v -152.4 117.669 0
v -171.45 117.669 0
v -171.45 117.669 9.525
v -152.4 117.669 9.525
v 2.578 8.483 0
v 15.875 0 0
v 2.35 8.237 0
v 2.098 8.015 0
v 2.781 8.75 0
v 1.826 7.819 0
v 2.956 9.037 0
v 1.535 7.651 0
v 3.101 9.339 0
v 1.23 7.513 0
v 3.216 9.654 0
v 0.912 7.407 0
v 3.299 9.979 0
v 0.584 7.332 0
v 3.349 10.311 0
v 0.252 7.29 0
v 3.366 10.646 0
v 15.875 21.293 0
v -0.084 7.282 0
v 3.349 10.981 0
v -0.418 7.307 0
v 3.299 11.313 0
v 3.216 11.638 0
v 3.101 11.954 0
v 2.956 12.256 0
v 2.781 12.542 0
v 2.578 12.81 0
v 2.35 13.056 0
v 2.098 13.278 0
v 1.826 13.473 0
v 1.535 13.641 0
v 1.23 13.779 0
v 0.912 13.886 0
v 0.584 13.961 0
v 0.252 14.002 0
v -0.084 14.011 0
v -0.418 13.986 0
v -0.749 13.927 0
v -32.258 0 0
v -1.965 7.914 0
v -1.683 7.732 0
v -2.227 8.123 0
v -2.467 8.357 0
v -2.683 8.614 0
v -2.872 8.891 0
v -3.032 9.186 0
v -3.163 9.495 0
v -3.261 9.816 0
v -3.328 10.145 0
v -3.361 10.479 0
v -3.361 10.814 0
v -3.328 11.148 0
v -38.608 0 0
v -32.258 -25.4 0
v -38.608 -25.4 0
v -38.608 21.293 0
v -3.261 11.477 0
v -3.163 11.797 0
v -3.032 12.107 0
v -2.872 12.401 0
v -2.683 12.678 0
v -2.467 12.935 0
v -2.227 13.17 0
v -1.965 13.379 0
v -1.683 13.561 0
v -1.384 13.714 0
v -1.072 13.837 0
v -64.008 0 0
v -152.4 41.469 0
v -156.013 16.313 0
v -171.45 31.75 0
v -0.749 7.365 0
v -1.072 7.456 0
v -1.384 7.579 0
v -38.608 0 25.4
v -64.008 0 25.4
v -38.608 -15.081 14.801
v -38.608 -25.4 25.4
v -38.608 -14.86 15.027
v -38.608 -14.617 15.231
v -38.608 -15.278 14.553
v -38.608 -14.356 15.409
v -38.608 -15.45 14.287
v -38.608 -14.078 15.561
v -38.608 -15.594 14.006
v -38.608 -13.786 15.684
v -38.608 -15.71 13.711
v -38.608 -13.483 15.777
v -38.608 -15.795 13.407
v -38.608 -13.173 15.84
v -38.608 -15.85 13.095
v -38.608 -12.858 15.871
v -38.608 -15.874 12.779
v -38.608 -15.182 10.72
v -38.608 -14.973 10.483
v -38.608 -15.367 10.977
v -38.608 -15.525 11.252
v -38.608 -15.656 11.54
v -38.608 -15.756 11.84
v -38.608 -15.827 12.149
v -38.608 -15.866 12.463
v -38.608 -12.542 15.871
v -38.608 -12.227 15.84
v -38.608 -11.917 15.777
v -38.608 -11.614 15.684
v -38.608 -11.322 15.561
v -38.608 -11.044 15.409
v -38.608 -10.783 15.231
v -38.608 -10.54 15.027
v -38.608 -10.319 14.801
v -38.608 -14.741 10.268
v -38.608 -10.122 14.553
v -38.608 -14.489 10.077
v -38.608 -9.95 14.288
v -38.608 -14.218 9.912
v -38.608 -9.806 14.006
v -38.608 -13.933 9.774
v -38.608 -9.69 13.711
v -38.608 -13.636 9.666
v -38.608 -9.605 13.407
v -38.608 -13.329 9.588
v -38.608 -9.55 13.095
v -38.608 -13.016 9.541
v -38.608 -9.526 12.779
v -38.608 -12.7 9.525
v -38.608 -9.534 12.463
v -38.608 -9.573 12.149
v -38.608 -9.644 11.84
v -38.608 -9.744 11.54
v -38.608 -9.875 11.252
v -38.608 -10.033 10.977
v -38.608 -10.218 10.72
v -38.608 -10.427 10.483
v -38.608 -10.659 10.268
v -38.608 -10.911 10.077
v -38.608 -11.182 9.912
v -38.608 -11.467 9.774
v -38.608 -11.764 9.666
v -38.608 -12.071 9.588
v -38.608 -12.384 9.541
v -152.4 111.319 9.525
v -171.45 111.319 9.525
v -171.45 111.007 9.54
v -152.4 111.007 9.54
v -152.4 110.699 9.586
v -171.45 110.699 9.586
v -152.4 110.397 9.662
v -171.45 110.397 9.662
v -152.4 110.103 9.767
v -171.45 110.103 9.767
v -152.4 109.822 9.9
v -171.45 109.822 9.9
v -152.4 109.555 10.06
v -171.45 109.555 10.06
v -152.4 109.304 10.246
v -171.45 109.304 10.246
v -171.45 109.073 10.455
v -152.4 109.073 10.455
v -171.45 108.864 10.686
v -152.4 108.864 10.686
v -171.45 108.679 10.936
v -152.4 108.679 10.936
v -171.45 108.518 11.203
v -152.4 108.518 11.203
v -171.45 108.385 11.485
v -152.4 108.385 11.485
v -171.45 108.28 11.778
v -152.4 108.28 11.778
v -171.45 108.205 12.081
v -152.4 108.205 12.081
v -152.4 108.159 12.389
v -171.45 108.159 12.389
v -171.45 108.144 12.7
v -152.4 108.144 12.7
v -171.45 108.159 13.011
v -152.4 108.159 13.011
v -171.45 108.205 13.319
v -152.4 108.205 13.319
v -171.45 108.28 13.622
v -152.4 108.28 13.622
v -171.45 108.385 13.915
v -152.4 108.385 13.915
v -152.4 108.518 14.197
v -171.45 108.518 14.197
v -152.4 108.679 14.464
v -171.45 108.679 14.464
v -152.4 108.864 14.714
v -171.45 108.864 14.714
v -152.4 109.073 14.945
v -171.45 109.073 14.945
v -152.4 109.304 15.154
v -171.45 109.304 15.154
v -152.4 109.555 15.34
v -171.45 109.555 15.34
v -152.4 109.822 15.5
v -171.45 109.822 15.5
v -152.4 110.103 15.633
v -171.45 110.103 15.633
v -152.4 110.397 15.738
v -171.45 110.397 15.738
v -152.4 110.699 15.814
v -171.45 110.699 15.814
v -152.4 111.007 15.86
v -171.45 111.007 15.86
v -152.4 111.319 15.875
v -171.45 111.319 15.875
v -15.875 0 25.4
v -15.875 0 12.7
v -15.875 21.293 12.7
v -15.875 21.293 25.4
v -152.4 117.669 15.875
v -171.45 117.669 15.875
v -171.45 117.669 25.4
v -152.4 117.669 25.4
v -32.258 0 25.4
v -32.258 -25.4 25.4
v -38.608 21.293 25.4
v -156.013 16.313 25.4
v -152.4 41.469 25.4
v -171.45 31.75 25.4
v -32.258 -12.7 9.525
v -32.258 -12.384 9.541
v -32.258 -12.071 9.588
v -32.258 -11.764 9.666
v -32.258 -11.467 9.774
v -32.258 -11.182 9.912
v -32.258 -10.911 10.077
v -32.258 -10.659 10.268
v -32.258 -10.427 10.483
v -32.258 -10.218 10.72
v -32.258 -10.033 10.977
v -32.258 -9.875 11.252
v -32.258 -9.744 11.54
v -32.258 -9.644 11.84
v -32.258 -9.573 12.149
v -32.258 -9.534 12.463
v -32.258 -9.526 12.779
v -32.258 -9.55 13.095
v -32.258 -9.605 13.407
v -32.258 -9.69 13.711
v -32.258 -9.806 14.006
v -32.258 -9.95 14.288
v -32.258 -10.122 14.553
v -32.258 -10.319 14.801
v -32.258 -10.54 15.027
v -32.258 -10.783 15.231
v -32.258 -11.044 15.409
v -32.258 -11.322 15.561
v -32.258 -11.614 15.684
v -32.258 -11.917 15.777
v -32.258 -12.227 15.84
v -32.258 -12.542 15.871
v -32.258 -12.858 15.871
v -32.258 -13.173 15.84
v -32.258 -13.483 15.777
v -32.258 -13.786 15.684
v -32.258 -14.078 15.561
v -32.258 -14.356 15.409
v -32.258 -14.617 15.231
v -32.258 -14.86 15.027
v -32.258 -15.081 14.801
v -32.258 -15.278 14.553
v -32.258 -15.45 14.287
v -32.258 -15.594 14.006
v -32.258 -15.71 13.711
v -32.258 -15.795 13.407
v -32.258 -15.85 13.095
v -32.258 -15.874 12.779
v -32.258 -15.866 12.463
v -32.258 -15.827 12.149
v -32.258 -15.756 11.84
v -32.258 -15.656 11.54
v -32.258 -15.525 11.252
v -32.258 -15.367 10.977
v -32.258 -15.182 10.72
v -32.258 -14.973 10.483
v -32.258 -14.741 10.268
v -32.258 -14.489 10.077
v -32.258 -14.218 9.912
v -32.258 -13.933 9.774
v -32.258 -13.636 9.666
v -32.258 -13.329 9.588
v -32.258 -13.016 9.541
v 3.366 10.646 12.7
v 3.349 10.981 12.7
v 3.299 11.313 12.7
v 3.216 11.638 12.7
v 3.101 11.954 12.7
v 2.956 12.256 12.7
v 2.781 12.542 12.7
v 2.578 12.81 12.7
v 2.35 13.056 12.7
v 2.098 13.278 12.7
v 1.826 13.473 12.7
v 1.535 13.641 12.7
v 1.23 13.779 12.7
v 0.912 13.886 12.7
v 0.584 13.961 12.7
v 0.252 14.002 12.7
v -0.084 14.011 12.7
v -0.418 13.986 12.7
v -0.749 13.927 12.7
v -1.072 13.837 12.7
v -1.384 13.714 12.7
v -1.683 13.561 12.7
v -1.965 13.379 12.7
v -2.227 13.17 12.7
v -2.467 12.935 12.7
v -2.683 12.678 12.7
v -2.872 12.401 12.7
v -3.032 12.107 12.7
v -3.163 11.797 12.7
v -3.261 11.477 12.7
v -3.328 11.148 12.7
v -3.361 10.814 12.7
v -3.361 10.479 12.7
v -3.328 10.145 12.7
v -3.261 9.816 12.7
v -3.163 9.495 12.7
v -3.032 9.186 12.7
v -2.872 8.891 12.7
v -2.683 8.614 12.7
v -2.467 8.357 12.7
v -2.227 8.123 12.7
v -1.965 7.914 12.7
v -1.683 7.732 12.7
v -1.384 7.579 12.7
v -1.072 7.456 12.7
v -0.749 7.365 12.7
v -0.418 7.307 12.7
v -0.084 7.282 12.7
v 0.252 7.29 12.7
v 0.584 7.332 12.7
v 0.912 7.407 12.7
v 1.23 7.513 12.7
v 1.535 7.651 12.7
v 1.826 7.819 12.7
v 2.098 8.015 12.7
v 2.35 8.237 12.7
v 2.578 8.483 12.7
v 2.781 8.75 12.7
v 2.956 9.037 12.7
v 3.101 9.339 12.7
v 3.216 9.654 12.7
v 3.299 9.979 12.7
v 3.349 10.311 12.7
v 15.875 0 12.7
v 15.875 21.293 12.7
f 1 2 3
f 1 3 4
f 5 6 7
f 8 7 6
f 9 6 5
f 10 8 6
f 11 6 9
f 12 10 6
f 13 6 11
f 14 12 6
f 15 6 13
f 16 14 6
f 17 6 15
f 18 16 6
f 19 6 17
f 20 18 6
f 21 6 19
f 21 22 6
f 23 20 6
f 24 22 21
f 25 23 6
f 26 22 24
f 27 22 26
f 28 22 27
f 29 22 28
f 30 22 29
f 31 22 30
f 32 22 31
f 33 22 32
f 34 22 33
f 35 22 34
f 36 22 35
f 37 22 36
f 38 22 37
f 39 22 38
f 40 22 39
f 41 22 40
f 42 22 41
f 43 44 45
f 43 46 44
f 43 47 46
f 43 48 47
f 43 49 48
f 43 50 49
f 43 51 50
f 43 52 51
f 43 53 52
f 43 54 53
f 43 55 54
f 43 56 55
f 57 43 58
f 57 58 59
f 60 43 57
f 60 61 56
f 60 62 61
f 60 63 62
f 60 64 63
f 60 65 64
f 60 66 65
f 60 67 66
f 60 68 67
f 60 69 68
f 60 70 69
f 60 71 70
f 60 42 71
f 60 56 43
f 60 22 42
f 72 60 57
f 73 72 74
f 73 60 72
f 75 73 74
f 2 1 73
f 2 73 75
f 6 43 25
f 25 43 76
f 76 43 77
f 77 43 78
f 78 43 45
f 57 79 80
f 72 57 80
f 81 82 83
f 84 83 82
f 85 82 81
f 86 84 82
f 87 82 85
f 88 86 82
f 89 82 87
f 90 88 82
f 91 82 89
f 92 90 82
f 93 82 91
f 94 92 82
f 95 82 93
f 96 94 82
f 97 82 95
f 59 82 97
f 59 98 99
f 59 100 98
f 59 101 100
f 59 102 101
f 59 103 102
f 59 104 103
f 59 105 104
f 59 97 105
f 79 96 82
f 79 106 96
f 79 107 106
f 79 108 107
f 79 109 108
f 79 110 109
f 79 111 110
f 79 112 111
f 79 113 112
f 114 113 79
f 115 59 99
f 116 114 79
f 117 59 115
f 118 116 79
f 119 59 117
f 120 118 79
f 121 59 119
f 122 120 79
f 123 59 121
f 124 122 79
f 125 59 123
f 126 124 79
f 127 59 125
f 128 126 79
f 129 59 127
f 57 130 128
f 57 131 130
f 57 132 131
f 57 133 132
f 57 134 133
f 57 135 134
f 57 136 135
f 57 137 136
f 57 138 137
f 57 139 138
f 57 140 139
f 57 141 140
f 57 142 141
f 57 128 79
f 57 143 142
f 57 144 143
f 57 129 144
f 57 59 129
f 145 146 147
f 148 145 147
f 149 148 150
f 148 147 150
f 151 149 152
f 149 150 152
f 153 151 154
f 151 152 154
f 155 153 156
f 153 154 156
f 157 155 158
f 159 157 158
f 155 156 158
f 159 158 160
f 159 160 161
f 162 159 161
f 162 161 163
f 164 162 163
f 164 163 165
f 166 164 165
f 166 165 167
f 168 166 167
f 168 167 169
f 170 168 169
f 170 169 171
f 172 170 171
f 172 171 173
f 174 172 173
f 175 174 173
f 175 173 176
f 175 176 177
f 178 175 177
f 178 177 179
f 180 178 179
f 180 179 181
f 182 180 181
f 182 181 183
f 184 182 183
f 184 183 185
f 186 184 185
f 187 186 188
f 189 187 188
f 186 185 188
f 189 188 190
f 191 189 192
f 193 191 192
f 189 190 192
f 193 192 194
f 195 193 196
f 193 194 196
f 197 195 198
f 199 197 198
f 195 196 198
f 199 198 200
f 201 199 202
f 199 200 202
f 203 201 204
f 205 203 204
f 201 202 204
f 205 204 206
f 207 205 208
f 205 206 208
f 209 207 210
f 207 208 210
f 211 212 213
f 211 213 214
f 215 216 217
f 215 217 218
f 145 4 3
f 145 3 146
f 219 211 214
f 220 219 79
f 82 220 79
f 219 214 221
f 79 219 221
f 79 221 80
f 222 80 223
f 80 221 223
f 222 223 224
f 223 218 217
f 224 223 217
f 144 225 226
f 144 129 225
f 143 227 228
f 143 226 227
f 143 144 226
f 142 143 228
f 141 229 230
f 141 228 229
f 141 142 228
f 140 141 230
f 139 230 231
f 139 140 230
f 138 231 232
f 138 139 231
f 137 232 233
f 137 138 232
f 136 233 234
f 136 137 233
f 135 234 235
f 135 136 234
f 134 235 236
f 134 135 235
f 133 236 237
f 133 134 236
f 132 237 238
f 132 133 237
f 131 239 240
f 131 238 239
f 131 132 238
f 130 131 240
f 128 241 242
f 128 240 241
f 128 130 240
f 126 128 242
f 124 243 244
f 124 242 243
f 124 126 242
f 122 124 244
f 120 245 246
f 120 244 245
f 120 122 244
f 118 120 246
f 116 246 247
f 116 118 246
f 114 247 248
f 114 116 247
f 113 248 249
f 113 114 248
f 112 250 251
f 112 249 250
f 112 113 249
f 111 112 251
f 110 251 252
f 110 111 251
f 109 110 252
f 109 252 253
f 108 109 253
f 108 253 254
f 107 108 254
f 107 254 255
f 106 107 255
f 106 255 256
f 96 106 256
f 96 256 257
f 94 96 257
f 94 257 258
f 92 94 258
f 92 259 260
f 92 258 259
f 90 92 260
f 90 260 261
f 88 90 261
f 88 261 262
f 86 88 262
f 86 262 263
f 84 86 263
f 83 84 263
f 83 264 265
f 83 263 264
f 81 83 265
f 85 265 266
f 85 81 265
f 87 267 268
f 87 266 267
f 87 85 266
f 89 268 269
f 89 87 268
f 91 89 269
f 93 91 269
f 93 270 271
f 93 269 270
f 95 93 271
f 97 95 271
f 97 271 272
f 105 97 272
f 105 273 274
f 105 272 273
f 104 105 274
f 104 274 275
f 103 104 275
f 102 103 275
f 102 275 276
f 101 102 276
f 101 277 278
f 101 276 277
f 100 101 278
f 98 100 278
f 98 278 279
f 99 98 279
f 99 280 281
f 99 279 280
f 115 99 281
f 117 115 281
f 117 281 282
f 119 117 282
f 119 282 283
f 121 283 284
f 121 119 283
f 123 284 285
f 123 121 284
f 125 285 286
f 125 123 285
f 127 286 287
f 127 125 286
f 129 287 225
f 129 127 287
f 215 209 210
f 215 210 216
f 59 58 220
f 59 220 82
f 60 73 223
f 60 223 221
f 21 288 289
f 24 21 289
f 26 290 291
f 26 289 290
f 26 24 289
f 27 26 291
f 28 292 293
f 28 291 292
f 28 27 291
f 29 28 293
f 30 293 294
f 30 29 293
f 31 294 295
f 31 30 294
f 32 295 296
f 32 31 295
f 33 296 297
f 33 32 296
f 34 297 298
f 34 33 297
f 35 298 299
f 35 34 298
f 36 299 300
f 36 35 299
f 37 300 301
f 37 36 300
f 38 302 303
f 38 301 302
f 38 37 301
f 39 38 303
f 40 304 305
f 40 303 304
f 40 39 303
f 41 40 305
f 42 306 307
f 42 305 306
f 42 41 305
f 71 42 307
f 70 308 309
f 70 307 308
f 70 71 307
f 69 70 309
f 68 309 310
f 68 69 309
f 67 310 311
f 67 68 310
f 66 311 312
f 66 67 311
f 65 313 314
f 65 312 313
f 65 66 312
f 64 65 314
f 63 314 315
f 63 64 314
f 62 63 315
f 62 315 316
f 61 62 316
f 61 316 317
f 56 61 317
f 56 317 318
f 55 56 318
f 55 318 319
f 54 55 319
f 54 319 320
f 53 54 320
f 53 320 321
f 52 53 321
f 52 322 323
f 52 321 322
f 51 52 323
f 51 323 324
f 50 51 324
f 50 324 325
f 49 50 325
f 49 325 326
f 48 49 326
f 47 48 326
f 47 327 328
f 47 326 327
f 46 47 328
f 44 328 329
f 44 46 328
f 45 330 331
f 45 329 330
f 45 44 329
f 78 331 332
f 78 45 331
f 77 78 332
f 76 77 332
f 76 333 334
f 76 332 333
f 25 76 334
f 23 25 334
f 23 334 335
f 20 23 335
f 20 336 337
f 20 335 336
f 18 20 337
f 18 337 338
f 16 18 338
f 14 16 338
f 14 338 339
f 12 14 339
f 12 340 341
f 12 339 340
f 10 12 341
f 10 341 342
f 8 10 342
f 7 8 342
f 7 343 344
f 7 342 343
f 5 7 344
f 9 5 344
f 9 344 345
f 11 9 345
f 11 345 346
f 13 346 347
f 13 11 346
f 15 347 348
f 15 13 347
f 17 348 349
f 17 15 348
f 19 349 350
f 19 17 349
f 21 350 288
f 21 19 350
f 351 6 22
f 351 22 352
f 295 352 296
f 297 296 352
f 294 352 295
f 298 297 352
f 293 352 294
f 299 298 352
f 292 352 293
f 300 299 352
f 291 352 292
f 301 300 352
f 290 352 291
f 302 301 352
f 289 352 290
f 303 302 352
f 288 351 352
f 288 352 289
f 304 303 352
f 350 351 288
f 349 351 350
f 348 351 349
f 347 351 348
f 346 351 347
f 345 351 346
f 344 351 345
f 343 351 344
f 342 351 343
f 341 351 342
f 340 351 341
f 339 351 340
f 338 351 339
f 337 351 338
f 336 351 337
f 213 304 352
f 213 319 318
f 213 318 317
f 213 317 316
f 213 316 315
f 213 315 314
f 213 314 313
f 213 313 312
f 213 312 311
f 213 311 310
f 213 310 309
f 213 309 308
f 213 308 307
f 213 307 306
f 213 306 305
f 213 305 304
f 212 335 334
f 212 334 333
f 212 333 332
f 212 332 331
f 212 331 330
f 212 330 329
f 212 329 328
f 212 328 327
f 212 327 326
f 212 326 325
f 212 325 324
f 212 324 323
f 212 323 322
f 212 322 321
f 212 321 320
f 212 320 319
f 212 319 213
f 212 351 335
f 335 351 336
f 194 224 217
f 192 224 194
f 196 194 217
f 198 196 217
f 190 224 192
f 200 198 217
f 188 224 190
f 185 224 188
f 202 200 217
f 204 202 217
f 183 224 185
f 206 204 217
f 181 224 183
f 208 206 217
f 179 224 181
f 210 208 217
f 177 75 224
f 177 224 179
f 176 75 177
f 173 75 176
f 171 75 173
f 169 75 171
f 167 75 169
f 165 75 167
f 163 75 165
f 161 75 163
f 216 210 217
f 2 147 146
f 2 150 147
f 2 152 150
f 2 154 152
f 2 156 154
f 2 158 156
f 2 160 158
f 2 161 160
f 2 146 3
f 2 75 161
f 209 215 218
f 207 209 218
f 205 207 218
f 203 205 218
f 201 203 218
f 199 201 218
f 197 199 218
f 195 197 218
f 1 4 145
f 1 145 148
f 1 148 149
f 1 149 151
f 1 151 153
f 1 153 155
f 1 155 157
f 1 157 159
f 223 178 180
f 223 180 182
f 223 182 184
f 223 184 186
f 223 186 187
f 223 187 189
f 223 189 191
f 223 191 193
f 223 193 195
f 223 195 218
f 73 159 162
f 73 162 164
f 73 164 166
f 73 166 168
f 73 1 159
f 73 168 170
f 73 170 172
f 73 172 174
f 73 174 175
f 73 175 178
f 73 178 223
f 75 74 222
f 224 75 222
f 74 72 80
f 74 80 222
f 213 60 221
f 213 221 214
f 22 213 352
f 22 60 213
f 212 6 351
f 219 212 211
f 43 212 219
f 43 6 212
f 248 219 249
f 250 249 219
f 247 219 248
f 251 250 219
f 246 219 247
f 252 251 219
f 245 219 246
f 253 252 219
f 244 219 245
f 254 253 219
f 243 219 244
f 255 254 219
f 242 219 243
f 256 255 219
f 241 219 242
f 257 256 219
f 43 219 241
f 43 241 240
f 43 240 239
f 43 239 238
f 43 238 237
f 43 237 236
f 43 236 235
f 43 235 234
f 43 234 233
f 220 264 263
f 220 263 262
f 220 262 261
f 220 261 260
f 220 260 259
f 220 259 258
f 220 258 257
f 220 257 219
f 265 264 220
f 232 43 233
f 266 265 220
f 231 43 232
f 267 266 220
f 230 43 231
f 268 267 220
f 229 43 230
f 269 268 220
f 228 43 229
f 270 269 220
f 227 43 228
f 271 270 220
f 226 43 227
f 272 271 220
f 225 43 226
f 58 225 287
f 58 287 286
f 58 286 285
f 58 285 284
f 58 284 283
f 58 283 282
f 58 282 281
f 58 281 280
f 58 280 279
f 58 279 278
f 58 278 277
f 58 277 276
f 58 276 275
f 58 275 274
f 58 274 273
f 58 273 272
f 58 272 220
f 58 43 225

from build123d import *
from OCP.BRepFilletAPI import BRepFilletAPI_MakeChamfer

# Parameters (mm, degrees)
BOSS_EXTRUDE1_DEPTH     = 25.4
CUT_EXTRUDE1_DEPTH      = 364.416353858
CUT_EXTRUDE1_DEPTH_BACK = 364.416353858
CUT_EXTRUDE2_DEPTH      = 243.106174261
CUT_EXTRUDE2_DEPTH_BACK = 243.106174261
SKETCH3_R               = 3.175
CHAMFER1_SIZE           = 12.7
CHAMFER1_SIZE2          = 15.677839289
CUT_EXTRUDE3_DEPTH      = 199.314331311
CUT_EXTRUDE3_DEPTH_BACK = 199.314331311
CUT_EXTRUDE4_DEPTH      = 209.332111666
CUT_EXTRUDE4_DEPTH_BACK = 209.332111666
SKETCH5_R               = 3.3655


with BuildPart() as part:
    # Sketch1 → Boss-Extrude1 (new body)
    with BuildSketch(Plane.XY):
        Polygon((32.258, 0), (-32.258, 0), (-32.258, -25.4), (-38.608, -25.4), (-38.608, 0), (-64.008, 0), (-171.45, 19.05), (-171.45, 117.668501525), (-152.4, 117.668501525), (-152.4, 41.468501525), (-38.608, 21.292615), (38.608, 21.292615), (152.4, 41.468501525), (152.4, 117.668501525), (171.45, 117.668501525), (171.45, 19.05), (64.008, 0), (38.608, 0), (38.608, -25.4), (32.258, -25.4), align=None)
    extrude(amount=BOSS_EXTRUDE1_DEPTH)

    # Sketch2 → Cut-Extrude1 (cut, two sides: drawn at the far end of the back side and taken through both)
    with BuildSketch(Plane(origin=(171.45, 0, 0), x_dir=(0, 0, -1), z_dir=(1, 0, 0)).offset(-CUT_EXTRUDE1_DEPTH_BACK)):
        with BuildLine():
            Line((-15.875, 117.668501525), (-9.525, 117.668501525))
            Line((-9.525, 117.668501525), (-9.525, 111.318501525))
            ThreePointArc((-9.525, 111.318501525), (-12.7, 108.143501525), (-15.875, 111.318501525))
            Line((-15.875, 111.318501525), (-15.875, 117.668501525))
        make_face()
    extrude(amount=CUT_EXTRUDE1_DEPTH + CUT_EXTRUDE1_DEPTH_BACK, mode=Mode.SUBTRACT)

    # Sketch3 → Cut-Extrude2 (cut, two sides: drawn at the far end of the back side and taken through both)
    with BuildSketch(Plane(origin=(38.608, 0, 0), x_dir=(0, 0, -1), z_dir=(1, 0, 0)).offset(-CUT_EXTRUDE2_DEPTH_BACK)):
        with Locations((-12.7, -12.7)):
            Circle(SKETCH3_R)
    extrude(amount=CUT_EXTRUDE2_DEPTH + CUT_EXTRUDE2_DEPTH_BACK, mode=Mode.SUBTRACT)

    # Chamfer1: one chamfer whose edges measure the first distance from different faces: ONE call of the kernel's chamfer builder (chamfer() names one face for all edges)
    chamfer1_edges_1 = [part.edges().sort_by_distance(p)[0] for p in [
        (-171.45, 19.05, 12.7),
    ]]
    chamfer1_side_1 = [part.faces().sort_by_distance(p)[0] for p in [
        (-171.45, 67.330500984, 12.7),
    ]]
    chamfer1_edges_2 = [part.edges().sort_by_distance(p)[0] for p in [
        (171.45, 19.05, 12.7),
    ]]
    chamfer1_side_2 = [part.faces().sort_by_distance(p)[0] for p in [
        (117.729, 9.525, 12.7),
    ]]
    chamfer1 = BRepFilletAPI_MakeChamfer(part.part.solid().wrapped)
    for e in chamfer1_edges_1:
        chamfer1.Add(CHAMFER1_SIZE, CHAMFER1_SIZE2, e.wrapped, chamfer1_side_1[0].wrapped)  # the first distance lies on this face
    for e in chamfer1_edges_2:
        chamfer1.Add(CHAMFER1_SIZE, CHAMFER1_SIZE2, e.wrapped, chamfer1_side_2[0].wrapped)  # the first distance lies on this face
    add(Compound.cast(chamfer1.Shape()), mode=Mode.REPLACE)

    # Sketch4 → Cut-Extrude3 (cut, two sides: drawn at the far end of the back side and taken through both)
    with BuildSketch(Plane(origin=(0, 21.292615, 0), x_dir=(1, 0, 0), z_dir=(0, 1, 0)).offset(-CUT_EXTRUDE3_DEPTH_BACK)):
        Polygon((15.875, 0), (15.875, -12.7), (-15.875, -12.7), (-15.875, -25.4), (141.747764855, -83.64087264), (246.478777591, -63.978728487), (187.893613379, 40.752284248), align=None)
    extrude(amount=CUT_EXTRUDE3_DEPTH + CUT_EXTRUDE3_DEPTH_BACK, mode=Mode.SUBTRACT)

    # Sketch5 → Cut-Extrude4 (cut, two sides: drawn at the far end of the back side and taken through both)
    with BuildSketch(Plane.XY.offset(12.7).offset(-CUT_EXTRUDE4_DEPTH_BACK)):
        with Locations((0, 10.6463075)):
            Circle(SKETCH5_R)
    extrude(amount=CUT_EXTRUDE4_DEPTH + CUT_EXTRUDE4_DEPTH_BACK, mode=Mode.SUBTRACT)


solid = part.part
